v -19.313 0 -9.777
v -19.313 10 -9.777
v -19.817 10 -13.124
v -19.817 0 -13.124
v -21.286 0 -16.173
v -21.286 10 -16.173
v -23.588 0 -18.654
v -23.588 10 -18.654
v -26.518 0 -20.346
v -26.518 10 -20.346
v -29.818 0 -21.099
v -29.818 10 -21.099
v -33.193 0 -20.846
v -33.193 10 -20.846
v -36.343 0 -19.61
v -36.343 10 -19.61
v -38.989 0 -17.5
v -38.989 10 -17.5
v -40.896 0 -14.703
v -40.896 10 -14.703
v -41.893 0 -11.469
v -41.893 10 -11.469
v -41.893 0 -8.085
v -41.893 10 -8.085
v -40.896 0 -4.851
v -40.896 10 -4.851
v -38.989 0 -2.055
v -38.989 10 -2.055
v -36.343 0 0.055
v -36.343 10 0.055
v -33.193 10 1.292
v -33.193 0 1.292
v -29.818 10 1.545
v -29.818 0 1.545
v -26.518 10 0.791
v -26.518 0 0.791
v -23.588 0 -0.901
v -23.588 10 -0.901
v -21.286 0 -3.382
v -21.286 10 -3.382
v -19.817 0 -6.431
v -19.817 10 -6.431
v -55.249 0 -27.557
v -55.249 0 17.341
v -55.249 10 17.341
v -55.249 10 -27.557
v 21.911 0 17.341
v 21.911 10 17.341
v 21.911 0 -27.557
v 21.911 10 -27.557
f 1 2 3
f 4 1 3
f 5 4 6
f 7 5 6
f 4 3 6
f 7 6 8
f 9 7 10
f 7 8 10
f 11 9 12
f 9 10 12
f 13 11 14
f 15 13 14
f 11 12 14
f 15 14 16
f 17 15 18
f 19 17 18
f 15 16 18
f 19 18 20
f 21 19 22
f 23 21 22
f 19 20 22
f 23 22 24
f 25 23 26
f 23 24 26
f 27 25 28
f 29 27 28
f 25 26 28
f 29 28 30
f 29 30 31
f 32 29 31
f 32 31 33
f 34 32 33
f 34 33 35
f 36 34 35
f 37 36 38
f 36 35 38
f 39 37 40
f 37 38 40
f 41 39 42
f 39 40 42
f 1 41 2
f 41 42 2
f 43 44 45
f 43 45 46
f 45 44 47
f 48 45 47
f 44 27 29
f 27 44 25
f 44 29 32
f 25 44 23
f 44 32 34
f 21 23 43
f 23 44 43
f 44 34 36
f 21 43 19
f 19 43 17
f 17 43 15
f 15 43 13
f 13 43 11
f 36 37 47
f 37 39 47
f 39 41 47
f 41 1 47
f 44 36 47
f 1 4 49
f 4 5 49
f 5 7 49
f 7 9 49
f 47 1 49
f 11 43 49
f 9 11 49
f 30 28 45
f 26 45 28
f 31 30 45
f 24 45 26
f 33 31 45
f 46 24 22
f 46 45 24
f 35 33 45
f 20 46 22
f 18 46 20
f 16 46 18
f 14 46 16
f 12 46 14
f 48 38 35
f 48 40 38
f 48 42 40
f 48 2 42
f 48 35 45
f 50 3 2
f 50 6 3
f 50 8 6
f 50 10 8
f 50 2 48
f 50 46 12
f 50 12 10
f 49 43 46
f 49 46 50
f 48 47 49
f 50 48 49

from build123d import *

# Parameters (mm, degrees)
SKETCH1_W           = 77.160601623
SKETCH1_H           = 44.898329167
BOSS_EXTRUDE1_DEPTH = 10
SKETCH2_R           = 11.353615653
CUT_EXTRUDE1_DEPTH  = 10


with BuildPart() as part:
    # Sketch1 → Boss-Extrude1 (new body)
    with BuildSketch(Plane(origin=(0, 0, 0), x_dir=(1, 0, 0), z_dir=(0, 1, 0))):
        with Locations((-16.668840769, 5.108193139)):
            Rectangle(SKETCH1_W, SKETCH1_H)
    extrude(amount=BOSS_EXTRUDE1_DEPTH)

    # Sketch2 → Cut-Extrude1 (cut)
    with BuildSketch(Plane(origin=(0, 10, 0), x_dir=(1, 0, 0), z_dir=(0, 1, 0))):
        with Locations((-30.666389333, 9.777294834)):
            Circle(SKETCH2_R)
    extrude(amount=-CUT_EXTRUDE1_DEPTH, mode=Mode.SUBTRACT)


solid = part.part
